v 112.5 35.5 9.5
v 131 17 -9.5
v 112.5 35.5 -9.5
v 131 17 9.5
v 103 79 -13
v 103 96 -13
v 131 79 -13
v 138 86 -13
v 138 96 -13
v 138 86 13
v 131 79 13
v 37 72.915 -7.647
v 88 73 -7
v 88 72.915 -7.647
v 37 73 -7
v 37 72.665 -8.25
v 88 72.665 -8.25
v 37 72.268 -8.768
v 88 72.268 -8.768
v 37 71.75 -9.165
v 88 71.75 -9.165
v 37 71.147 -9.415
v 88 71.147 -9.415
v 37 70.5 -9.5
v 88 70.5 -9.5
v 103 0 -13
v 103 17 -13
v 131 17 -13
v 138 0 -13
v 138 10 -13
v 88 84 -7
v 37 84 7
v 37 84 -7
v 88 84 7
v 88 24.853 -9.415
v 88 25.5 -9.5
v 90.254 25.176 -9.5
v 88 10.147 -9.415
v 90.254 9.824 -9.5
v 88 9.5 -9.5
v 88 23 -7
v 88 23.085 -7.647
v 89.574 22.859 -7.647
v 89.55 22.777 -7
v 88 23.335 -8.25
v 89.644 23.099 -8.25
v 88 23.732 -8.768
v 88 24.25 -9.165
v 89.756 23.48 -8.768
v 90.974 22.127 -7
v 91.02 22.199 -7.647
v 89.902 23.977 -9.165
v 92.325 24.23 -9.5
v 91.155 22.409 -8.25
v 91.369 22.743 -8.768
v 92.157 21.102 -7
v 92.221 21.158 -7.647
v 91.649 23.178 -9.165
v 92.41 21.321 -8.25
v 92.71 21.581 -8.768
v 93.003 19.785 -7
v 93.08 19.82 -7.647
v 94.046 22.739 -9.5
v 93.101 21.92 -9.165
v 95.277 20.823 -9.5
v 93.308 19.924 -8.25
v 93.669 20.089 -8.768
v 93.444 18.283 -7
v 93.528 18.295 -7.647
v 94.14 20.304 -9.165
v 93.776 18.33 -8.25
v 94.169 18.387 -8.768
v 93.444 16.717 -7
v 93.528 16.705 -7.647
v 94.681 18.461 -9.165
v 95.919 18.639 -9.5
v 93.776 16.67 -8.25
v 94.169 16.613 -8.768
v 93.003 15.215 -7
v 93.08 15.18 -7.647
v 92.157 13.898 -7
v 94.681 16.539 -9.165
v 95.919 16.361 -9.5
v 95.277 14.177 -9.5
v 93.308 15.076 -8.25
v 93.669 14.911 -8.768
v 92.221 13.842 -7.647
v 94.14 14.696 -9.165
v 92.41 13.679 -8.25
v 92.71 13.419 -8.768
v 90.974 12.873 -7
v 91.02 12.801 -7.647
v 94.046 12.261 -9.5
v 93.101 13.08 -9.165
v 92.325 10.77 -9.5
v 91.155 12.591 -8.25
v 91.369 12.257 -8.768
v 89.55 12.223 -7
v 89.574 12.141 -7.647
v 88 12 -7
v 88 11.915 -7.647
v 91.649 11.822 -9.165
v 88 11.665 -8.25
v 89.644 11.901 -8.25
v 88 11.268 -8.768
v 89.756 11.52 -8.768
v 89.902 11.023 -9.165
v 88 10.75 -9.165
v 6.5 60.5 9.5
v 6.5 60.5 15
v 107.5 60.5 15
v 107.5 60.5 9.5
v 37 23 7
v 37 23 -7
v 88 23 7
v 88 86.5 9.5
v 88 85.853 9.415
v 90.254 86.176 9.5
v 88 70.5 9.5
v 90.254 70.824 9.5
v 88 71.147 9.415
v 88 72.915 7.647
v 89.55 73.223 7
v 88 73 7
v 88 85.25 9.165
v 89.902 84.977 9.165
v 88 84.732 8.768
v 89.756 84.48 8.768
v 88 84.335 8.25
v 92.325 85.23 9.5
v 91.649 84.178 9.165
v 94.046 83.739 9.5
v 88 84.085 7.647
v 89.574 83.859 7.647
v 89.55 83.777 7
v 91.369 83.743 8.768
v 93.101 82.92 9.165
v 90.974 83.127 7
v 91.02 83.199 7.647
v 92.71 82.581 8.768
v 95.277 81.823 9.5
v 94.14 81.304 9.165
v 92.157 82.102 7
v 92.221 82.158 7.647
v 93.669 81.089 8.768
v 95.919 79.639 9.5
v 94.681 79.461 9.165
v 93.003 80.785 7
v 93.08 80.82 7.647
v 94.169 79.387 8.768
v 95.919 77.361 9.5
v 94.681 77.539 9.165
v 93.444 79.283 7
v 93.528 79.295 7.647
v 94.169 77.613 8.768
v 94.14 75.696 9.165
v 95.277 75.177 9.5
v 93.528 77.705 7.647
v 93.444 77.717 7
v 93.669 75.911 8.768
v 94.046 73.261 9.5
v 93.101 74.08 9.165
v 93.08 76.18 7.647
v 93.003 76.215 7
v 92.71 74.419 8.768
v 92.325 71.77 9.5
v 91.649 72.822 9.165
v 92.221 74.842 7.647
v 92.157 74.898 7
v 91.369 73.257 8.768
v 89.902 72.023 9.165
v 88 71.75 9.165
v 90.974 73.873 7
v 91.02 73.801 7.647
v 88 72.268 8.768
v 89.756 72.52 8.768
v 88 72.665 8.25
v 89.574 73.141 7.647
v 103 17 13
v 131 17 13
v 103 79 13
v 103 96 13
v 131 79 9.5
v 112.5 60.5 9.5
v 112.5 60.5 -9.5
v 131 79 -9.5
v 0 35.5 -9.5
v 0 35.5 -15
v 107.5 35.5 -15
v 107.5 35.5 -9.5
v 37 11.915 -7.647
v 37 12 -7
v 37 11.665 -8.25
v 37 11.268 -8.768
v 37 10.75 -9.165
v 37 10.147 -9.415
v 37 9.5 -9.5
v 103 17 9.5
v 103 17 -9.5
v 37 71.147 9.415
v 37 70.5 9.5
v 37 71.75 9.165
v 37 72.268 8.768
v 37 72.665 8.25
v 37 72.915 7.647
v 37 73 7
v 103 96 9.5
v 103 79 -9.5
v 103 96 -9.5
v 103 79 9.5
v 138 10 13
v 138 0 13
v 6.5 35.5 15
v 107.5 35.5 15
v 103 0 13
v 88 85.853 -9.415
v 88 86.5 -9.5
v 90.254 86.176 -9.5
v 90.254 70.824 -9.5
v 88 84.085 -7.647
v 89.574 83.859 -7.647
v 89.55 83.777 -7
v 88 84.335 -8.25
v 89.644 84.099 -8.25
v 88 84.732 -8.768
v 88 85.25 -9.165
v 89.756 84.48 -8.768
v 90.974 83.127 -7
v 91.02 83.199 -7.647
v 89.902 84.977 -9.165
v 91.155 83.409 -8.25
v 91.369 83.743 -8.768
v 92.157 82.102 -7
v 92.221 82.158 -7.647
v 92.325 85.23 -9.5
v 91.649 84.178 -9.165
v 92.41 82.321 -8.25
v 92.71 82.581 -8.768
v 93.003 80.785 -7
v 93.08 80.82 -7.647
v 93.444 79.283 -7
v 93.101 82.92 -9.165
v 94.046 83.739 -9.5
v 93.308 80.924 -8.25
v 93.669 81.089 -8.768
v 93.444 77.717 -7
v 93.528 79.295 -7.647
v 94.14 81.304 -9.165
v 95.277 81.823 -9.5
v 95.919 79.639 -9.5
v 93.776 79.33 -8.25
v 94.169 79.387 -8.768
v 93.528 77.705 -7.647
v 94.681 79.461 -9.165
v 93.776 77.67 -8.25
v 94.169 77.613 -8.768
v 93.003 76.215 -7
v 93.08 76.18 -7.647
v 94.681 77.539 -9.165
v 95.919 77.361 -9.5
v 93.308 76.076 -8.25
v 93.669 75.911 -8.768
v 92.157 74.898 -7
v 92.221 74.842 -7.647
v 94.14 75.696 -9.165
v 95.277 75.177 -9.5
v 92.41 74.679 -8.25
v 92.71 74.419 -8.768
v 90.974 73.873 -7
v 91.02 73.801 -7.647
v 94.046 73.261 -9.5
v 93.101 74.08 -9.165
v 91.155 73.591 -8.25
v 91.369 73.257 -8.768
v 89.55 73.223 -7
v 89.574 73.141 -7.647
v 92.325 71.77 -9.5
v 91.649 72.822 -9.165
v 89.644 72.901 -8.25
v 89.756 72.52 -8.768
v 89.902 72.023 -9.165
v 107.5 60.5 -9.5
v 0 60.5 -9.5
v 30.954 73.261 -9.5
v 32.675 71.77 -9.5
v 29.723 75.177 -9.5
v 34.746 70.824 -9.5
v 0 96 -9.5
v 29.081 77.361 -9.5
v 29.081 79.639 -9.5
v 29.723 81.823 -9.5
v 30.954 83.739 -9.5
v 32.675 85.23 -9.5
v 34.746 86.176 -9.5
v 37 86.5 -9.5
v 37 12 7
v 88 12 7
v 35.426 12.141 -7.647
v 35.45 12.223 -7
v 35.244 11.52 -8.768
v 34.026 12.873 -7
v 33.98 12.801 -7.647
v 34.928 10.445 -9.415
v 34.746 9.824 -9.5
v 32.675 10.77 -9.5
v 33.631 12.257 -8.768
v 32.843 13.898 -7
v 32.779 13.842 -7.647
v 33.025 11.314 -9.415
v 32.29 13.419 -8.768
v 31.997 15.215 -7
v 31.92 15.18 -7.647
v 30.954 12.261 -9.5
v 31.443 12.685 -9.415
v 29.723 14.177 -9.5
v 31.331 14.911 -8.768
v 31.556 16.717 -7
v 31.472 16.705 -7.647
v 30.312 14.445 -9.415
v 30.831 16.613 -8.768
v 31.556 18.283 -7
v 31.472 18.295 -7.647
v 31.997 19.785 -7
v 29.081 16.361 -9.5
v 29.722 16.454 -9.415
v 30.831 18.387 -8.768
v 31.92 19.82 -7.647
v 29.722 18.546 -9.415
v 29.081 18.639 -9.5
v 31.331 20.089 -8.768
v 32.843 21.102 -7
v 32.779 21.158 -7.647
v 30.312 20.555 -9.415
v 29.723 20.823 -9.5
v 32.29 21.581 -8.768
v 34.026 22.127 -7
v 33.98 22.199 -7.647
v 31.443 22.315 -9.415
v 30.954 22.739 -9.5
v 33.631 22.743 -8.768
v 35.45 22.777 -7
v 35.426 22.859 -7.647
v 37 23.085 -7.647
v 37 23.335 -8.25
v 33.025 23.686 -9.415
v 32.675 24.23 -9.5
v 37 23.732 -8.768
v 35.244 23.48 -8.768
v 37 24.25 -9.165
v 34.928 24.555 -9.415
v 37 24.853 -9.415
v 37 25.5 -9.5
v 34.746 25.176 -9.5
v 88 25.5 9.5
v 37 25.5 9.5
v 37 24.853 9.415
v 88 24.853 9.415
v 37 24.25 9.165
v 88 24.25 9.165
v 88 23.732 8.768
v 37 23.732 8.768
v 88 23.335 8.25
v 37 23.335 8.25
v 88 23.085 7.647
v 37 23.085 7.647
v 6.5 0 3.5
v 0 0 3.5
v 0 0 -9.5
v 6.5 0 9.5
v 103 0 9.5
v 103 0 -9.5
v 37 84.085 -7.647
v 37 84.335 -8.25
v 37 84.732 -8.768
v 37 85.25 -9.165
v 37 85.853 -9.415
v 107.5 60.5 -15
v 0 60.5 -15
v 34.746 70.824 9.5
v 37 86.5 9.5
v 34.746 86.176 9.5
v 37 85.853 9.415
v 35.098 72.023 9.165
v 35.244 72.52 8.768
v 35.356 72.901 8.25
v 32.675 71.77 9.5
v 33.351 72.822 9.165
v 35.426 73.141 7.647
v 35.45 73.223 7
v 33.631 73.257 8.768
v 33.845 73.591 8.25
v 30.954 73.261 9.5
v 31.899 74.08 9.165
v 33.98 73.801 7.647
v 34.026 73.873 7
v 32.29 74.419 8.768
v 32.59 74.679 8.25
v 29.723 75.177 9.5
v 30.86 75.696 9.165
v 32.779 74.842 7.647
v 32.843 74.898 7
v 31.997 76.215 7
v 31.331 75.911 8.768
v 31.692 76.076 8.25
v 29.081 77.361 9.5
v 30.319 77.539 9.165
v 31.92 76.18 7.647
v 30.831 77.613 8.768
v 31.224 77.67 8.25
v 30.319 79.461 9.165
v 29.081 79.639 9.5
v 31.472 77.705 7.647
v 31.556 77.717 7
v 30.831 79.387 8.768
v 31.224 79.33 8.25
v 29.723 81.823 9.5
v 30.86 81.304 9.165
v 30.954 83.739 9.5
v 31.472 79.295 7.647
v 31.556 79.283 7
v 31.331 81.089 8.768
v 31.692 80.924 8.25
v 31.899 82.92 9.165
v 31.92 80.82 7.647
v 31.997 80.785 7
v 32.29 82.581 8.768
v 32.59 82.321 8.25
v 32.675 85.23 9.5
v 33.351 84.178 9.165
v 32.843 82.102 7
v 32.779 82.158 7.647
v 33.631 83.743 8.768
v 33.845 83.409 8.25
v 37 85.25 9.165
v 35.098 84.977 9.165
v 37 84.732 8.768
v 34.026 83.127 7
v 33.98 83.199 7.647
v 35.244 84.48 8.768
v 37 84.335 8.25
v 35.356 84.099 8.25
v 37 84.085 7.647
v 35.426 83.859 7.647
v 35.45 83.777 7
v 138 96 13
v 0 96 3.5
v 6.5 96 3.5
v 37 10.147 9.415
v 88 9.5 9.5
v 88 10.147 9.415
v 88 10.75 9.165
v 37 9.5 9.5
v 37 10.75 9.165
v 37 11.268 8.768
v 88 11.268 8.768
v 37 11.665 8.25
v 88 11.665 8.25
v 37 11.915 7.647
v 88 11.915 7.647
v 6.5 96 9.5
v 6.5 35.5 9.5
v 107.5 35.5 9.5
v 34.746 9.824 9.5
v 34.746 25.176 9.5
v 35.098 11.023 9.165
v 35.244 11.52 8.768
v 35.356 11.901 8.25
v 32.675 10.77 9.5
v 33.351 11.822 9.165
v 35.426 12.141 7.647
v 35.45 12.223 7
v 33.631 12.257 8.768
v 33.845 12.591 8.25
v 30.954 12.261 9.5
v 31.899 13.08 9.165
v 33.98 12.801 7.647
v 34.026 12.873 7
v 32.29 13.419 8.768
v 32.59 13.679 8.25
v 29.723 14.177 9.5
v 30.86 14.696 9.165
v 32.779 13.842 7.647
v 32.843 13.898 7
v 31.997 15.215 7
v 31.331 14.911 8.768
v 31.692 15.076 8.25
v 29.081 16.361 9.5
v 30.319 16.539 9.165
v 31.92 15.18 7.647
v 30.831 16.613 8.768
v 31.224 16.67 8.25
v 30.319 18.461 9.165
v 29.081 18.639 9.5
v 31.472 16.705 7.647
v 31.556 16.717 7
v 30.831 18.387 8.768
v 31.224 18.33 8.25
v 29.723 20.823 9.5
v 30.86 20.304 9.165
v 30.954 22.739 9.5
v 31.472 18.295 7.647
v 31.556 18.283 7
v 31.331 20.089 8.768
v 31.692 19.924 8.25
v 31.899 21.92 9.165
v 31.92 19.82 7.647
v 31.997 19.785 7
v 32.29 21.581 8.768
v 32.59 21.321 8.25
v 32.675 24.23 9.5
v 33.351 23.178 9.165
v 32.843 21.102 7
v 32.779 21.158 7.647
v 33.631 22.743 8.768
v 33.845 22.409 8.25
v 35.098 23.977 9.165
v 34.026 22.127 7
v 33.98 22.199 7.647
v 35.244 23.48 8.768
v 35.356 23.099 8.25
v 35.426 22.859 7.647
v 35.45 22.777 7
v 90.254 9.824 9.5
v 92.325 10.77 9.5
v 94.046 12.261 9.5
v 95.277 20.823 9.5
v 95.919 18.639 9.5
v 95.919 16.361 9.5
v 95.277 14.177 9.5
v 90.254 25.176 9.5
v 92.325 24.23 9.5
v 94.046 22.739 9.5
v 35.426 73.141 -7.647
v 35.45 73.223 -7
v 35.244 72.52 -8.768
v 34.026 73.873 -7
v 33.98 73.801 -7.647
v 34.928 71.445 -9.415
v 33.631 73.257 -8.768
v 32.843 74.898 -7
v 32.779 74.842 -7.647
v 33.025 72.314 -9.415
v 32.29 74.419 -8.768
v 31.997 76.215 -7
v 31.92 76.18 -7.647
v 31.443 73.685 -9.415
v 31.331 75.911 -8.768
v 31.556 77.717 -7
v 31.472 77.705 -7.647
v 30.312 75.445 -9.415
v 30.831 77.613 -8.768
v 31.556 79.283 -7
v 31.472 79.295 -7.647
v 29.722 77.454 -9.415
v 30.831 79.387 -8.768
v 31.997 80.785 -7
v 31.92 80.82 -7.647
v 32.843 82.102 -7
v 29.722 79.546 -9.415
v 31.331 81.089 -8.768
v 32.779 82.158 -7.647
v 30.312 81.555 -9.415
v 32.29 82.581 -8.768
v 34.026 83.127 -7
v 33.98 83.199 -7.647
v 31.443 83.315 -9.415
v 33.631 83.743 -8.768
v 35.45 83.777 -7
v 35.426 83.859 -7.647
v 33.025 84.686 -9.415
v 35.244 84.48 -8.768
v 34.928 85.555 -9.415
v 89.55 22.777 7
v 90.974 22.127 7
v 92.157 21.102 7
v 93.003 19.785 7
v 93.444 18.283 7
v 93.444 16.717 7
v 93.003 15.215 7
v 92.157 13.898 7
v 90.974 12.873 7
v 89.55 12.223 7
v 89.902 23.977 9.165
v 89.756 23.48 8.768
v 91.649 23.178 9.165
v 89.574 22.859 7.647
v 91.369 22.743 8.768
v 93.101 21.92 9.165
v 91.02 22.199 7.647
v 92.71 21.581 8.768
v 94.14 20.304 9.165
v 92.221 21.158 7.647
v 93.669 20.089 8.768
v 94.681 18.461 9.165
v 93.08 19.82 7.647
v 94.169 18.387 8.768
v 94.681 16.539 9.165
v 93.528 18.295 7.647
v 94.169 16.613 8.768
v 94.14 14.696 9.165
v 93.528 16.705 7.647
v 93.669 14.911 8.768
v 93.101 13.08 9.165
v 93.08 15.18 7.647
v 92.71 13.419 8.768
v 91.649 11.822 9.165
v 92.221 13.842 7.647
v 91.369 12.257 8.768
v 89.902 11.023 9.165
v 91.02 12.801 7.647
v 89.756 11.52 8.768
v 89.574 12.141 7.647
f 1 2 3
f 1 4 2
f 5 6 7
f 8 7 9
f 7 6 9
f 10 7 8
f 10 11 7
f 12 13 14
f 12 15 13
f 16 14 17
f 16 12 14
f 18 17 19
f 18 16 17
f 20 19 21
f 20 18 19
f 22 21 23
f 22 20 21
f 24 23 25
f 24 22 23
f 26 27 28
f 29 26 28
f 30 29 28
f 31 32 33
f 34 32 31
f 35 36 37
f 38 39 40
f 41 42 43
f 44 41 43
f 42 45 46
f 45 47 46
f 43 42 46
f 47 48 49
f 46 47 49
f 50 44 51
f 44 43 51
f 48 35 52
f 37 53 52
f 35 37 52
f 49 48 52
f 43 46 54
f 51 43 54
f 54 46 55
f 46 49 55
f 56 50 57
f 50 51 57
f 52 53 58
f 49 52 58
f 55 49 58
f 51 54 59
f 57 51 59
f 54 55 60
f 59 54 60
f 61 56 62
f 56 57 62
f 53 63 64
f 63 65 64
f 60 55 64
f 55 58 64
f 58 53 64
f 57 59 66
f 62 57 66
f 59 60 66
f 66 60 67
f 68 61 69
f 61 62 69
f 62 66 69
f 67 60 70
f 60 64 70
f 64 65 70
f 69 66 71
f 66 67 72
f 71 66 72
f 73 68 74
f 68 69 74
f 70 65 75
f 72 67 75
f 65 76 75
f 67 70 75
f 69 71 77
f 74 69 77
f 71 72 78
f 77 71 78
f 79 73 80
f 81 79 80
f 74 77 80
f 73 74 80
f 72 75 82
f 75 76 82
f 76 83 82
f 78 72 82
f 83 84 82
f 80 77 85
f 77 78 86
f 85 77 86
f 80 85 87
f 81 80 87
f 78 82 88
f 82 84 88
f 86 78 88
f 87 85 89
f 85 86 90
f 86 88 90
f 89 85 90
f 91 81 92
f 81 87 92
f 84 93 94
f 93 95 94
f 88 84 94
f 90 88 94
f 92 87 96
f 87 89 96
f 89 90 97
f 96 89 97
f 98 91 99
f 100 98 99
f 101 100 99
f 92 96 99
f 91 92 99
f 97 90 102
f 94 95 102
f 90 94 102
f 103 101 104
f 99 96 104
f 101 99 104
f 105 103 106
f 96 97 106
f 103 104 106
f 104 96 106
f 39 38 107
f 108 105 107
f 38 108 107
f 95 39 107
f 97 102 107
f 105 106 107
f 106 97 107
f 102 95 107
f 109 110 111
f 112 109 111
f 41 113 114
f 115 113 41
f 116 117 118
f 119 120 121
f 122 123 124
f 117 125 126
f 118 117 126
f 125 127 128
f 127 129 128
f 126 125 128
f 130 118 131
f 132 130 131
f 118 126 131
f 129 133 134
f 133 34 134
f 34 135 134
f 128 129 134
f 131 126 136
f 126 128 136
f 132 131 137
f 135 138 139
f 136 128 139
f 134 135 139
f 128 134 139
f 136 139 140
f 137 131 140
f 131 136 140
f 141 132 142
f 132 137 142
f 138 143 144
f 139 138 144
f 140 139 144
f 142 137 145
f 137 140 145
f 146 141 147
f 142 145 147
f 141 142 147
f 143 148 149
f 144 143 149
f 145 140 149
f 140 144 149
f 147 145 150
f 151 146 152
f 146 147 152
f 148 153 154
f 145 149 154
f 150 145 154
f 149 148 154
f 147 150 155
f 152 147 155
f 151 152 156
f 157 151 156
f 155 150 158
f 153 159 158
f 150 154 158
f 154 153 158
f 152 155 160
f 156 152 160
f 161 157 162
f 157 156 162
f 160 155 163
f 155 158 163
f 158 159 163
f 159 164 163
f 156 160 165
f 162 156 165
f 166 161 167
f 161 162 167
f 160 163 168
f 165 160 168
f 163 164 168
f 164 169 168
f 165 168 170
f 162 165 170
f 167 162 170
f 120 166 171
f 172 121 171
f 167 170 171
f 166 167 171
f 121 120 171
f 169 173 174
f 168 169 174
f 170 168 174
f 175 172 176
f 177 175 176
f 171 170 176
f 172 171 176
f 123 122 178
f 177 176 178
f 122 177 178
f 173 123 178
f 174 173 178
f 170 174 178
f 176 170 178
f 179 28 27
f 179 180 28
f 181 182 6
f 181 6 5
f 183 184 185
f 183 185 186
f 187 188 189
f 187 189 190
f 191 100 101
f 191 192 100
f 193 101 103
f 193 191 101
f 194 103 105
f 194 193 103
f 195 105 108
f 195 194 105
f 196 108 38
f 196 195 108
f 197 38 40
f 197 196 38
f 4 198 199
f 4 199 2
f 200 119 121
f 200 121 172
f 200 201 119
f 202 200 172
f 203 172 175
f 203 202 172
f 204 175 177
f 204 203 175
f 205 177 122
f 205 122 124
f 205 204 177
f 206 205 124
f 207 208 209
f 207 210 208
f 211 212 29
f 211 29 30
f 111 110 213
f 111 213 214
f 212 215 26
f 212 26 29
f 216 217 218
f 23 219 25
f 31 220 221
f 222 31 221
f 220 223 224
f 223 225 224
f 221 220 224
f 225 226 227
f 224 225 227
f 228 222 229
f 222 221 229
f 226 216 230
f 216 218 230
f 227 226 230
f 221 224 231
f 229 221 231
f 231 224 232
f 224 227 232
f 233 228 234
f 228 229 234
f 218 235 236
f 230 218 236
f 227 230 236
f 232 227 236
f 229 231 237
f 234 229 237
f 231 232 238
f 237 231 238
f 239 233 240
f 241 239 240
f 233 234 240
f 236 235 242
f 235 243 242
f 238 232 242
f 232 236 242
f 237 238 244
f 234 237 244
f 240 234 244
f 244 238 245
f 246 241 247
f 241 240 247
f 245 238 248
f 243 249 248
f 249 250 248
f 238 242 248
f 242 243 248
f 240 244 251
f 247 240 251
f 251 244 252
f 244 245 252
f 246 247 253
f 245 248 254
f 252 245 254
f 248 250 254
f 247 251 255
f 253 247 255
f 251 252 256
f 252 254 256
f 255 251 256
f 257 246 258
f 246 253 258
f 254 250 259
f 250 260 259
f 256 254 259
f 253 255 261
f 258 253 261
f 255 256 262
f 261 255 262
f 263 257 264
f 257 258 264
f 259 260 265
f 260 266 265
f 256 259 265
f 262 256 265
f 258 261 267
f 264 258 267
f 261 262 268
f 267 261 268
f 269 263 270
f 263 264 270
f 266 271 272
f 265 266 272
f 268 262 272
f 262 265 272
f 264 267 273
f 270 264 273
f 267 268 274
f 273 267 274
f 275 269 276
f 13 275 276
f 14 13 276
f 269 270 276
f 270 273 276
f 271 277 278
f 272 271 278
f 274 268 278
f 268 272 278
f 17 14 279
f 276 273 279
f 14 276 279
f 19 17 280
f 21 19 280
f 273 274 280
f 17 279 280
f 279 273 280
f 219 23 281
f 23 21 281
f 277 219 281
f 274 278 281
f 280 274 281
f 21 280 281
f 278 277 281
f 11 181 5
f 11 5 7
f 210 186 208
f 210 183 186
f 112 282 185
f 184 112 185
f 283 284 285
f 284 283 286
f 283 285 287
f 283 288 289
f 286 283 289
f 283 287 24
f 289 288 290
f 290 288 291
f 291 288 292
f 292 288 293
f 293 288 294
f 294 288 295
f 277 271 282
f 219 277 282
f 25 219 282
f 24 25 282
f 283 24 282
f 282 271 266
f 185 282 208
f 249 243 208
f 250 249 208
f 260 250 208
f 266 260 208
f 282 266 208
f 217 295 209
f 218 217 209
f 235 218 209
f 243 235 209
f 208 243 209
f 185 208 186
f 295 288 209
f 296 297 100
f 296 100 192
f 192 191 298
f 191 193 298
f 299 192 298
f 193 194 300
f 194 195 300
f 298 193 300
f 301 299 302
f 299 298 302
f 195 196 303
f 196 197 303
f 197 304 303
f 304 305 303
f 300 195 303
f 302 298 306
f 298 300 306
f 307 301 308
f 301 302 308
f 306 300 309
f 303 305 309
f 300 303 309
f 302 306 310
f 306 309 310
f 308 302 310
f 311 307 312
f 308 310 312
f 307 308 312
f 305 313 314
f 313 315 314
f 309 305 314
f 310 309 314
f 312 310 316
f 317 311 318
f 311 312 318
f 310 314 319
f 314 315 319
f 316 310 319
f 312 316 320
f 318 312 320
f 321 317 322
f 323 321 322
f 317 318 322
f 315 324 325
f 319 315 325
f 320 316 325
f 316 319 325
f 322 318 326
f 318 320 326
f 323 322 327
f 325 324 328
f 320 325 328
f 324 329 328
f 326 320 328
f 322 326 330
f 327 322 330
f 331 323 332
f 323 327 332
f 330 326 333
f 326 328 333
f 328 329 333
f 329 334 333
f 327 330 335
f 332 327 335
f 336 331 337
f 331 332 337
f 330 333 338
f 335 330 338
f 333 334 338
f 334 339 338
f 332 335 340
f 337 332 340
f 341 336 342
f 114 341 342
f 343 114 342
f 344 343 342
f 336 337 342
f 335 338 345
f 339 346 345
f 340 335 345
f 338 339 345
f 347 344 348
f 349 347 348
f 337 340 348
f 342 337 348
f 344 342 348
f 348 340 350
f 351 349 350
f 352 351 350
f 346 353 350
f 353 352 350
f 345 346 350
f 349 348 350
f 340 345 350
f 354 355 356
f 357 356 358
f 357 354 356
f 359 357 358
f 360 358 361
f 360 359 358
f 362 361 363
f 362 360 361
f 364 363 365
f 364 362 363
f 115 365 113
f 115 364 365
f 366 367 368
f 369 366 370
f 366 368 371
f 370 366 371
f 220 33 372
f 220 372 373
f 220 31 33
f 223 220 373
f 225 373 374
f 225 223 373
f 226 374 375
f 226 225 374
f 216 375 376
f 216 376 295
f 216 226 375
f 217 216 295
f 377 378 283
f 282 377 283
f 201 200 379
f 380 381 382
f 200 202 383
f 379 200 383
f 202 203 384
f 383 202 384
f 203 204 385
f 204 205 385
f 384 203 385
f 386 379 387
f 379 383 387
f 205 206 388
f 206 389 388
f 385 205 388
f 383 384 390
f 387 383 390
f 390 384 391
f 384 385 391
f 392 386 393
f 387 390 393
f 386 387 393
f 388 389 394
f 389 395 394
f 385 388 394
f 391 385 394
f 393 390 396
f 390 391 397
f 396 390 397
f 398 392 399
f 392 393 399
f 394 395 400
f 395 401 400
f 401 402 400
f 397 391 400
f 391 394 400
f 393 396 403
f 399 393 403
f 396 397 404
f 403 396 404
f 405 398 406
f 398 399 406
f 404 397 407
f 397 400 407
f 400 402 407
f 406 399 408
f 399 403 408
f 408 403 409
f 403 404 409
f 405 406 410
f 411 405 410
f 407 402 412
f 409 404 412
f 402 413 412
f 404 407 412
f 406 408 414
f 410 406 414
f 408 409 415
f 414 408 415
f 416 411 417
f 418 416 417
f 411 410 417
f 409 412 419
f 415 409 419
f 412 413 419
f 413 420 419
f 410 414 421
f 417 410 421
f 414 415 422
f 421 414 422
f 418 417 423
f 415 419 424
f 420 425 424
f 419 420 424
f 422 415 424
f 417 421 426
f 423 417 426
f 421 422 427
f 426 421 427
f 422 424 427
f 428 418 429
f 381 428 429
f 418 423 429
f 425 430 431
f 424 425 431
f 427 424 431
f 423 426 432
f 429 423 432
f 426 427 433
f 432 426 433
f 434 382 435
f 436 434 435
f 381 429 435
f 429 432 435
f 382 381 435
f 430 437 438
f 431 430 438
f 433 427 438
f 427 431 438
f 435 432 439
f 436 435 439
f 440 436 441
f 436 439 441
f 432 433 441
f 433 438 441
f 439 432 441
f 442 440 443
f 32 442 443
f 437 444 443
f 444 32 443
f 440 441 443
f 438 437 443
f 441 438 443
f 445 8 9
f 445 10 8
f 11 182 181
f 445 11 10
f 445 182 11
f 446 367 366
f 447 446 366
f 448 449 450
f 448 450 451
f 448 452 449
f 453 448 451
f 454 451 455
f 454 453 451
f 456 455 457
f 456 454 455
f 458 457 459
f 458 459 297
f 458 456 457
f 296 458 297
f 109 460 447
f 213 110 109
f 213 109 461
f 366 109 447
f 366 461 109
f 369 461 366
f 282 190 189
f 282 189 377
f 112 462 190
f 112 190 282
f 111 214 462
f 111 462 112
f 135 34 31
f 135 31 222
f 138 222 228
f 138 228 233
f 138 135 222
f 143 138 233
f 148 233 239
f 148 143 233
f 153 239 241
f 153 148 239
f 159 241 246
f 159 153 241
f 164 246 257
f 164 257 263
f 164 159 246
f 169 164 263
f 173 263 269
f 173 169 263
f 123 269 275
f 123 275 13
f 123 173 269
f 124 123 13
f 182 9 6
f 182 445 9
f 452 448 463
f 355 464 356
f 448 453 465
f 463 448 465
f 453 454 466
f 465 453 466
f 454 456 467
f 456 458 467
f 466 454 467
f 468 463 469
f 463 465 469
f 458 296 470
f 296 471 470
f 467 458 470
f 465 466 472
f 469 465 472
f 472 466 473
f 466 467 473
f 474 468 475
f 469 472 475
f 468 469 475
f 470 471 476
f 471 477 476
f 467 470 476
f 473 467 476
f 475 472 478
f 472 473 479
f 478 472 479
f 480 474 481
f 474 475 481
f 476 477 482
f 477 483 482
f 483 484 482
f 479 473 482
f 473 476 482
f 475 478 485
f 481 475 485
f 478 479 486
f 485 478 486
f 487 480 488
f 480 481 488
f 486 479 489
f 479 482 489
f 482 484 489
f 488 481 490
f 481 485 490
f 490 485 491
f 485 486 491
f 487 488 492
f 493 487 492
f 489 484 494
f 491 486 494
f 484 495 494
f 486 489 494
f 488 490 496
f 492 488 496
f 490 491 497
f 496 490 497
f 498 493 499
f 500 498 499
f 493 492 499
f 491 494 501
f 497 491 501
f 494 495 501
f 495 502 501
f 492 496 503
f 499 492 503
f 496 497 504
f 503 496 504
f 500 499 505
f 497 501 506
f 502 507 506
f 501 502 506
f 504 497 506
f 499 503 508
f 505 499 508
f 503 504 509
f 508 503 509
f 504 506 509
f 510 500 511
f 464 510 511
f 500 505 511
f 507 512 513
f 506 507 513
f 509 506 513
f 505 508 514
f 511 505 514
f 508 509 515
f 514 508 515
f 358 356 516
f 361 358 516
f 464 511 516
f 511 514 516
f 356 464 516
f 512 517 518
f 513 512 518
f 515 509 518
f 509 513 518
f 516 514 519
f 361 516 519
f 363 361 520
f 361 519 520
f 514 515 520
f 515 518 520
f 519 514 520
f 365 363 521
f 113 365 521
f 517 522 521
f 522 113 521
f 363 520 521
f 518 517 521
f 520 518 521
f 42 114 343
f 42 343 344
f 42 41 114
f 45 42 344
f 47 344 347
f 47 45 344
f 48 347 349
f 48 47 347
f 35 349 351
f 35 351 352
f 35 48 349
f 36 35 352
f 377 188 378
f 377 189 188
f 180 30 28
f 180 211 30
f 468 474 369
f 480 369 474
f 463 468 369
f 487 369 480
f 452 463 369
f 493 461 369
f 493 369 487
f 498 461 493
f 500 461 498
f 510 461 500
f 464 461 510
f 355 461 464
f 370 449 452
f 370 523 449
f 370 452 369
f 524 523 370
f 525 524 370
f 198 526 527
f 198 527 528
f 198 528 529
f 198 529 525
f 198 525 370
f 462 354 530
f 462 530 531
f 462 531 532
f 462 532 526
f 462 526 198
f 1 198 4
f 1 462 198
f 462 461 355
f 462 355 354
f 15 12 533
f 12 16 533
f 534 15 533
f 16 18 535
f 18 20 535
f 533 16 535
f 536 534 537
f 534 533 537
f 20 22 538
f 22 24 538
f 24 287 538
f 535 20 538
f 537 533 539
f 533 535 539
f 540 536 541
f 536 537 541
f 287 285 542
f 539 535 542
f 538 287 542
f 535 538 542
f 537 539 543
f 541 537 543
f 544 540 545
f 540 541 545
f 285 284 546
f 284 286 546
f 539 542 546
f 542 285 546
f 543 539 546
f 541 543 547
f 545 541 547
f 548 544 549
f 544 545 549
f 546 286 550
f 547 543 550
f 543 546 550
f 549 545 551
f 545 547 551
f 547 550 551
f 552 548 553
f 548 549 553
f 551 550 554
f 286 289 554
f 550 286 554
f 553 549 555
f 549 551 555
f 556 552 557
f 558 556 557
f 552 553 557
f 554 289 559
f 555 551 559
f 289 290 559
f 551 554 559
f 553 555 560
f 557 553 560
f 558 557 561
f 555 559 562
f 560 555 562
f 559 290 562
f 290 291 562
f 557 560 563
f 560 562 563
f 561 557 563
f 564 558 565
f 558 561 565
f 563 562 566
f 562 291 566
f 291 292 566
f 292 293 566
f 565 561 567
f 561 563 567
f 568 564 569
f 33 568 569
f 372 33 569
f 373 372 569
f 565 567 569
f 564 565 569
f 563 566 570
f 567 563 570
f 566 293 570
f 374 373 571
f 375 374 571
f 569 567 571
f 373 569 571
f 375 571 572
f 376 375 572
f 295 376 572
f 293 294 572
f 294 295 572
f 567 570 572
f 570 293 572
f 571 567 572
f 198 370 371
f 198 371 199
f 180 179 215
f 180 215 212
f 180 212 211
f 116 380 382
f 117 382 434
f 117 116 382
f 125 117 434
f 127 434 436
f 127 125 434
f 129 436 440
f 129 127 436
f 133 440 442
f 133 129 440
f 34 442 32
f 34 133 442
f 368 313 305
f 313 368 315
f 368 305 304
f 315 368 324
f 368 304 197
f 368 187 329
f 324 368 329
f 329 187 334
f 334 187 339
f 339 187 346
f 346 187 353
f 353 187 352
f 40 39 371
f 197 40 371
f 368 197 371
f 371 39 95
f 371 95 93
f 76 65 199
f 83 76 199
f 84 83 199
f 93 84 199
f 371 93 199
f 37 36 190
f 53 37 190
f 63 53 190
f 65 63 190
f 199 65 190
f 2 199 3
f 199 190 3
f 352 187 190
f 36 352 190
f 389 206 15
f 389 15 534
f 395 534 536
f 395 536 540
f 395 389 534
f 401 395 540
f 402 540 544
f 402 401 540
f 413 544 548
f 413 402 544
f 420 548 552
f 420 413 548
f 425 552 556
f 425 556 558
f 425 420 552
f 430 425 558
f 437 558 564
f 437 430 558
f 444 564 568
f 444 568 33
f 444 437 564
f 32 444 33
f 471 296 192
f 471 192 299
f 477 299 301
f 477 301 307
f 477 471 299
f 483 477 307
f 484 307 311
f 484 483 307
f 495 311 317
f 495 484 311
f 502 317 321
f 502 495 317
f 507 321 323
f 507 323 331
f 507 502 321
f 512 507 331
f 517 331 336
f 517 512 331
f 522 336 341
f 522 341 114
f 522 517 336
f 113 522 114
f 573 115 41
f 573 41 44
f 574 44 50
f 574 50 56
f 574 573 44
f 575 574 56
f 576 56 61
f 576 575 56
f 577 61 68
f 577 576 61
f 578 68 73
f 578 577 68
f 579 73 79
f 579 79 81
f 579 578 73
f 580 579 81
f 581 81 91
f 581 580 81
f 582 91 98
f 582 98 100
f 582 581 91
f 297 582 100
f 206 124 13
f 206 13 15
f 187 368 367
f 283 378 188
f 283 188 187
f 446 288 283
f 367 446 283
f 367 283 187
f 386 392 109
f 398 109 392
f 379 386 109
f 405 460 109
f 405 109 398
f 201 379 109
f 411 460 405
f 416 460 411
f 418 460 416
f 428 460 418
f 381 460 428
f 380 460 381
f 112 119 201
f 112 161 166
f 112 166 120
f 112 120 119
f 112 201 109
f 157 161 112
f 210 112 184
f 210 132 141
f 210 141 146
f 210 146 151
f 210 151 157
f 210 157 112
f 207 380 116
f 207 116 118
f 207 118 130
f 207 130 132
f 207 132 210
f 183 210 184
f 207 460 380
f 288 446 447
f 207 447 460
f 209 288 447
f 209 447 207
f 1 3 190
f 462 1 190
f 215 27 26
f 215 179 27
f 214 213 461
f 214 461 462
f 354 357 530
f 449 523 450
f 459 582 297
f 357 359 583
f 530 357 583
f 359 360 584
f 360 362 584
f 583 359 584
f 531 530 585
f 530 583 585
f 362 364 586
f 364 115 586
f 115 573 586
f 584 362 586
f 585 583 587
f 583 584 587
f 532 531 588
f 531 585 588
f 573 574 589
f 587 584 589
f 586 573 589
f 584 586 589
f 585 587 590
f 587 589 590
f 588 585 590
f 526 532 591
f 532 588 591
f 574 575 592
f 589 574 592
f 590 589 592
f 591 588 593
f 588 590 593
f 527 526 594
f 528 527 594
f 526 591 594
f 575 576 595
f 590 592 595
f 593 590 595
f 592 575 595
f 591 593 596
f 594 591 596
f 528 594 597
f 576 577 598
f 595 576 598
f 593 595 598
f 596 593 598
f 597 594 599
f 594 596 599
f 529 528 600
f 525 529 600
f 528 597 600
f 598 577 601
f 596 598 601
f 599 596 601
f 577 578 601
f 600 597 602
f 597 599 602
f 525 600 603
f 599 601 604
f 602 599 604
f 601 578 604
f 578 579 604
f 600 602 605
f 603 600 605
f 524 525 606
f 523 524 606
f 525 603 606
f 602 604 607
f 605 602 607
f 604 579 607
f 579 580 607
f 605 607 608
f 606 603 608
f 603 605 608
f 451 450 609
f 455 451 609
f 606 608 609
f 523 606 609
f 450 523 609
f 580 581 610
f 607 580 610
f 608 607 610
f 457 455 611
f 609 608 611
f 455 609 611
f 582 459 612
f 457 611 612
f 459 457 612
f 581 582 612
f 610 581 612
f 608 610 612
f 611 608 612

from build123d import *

# Parameters (mm, degrees)
SKETCH1_W             = 101
SKETCH1_H             = 25
BOSS_EXTRUDE1_DEPTH   = 15
BOSS_EXTRUDE2_DEPTH   = 13
BOSS_EXTRUDE2_2_DEPTH = 13
BOSS_EXTRUDE3_DEPTH   = 9.5
BOSS_EXTRUDE3_2_DEPTH = 9.5
FILLET1_R             = 2.5
FILLET2_R             = 2.5
SKETCH1_9_W           = 6.5
SKETCH1_9_H           = 96
BOSS_EXTRUDE5_DEPTH   = 9.5
SKETCH1_10_W          = 6.5
SKETCH1_10_H          = 96
BOSS_EXTRUDE6_DEPTH   = 3.5
SKETCH2_W             = 5.5
SKETCH2_H             = 25
BOSS_EXTRUDE7_DEPTH   = 6.5


with BuildPart() as part:
    # Sketch1 → Boss-Extrude1 (new, symmetric)
    with BuildSketch(Plane.XY):
        with Locations((57, 48)):
            Rectangle(SKETCH1_W, SKETCH1_H)
    extrude(amount=BOSS_EXTRUDE1_DEPTH, both=True)



with BuildPart() as body_2:
    # Sketch1<4> → Boss-Extrude2 (new, symmetric)
    with BuildSketch(Plane.XY):
        Polygon((103, 17), (103, 0), (138, 0), (138, 10), (131, 17), align=None)
    extrude(amount=BOSS_EXTRUDE2_DEPTH, both=True)


with BuildPart() as body_3:
    # Sketch1<4> → Boss-Extrude2 2 (new, symmetric)
    with BuildSketch(Plane.XY):
        Polygon((138, 96), (103, 96), (103, 79), (131, 79), (138, 86), align=None)
    extrude(amount=BOSS_EXTRUDE2_2_DEPTH, both=True)


with BuildPart() as body_4:
    # Sketch1<5> → Boss-Extrude3 (new, symmetric)
    with BuildSketch(Plane.XY):
        Polygon((103, 96), (6.5, 96), (6.5, 60.5), (107.5, 60.5), (112.5, 60.5), (131, 79), (103, 79), align=None)
        with BuildLine():
            ThreePointArc((37, 73), (31.5, 78.5), (37, 84))
            Line((37, 84), (88, 84))
            ThreePointArc((88, 84), (93.5, 78.5), (88, 73))
            Line((88, 73), (37, 73))
        make_face(mode=Mode.SUBTRACT)
    extrude(amount=BOSS_EXTRUDE3_DEPTH, both=True)

    # Fillet1
    fillet1_edges = [body_4.edges().sort_by_distance(p)[0] for p in [
        (62.5, 73, 9.5),
        (62.5, 84, -9.5),
        (31.5, 78.5, 9.5),
        (31.5, 78.5, -9.5),
        (62.5, 73, -9.5),
        (93.5, 78.5, -9.5),
        (62.5, 84, 9.5),
        (93.5, 78.5, 9.5),
    ]]
    fillet(fillet1_edges, radius=FILLET1_R)


with BuildPart() as body_5:
    # Sketch1<5> → Boss-Extrude3 2 (new, symmetric)
    with BuildSketch(Plane.XY):
        Polygon((107.5, 35.5), (6.5, 35.5), (6.5, 0), (103, 0), (103, 17), (131, 17), (112.5, 35.5), align=None)
        with BuildLine():
            ThreePointArc((37, 12), (31.5, 17.5), (37, 23))
            Line((37, 23), (88, 23))
            ThreePointArc((88, 23), (93.5, 17.5), (88, 12))
            Line((88, 12), (37, 12))
        make_face(mode=Mode.SUBTRACT)
    extrude(amount=BOSS_EXTRUDE3_2_DEPTH, both=True)

    # Fillet2
    fillet2_edges = [body_5.edges().sort_by_distance(p)[0] for p in [
        (62.5, 12, 9.5),
        (62.5, 23, -9.5),
        (31.5, 17.5, 9.5),
        (31.5, 17.5, -9.5),
        (62.5, 12, -9.5),
        (93.5, 17.5, -9.5),
        (62.5, 23, 9.5),
        (93.5, 17.5, 9.5),
    ]]
    fillet(fillet2_edges, radius=FILLET2_R)


with BuildPart() as part_1:
    add(part.part)

    add(body_4.part)  # Boss-Extrude5 merges body 4

    add(body_5.part)  # Boss-Extrude5 merges body 5
    # Sketch1<9> → Boss-Extrude5 (add)
    with BuildSketch(Plane.XY):
        with Locations((3.25, 48)):
            Rectangle(SKETCH1_9_W, SKETCH1_9_H)
    extrude(amount=-BOSS_EXTRUDE5_DEPTH)

    # Sketch1<10> → Boss-Extrude6 (add)
    with BuildSketch(Plane.XY):
        with Locations((3.25, 48)):
            Rectangle(SKETCH1_10_W, SKETCH1_10_H)
    extrude(amount=BOSS_EXTRUDE6_DEPTH)

    # Sketch2 → Boss-Extrude7 (add)
    with BuildSketch(Plane.ZY.offset(-6.5)):
        with Locations((-12.25, 48)):
            Rectangle(SKETCH2_W, SKETCH2_H)
    extrude(amount=BOSS_EXTRUDE7_DEPTH)


solid = Compound([body_2.part, body_3.part, part_1.part])
